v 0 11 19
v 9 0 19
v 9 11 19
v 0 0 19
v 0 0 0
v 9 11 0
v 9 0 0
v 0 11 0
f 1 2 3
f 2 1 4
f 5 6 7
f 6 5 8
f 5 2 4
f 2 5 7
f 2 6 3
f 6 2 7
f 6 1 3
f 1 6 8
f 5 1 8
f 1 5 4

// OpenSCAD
// Generated by SolidPython 1.0.1 on 2020-07-29 00:39:26


cube(size = [9, 11, 19]);
/***********************************************
*********      SolidPython code:      **********
************************************************
 
# import packages: SolidPython
from solid import *
from solid.utils import *
from itertools import chain, combinations


class Resize:

    def __init__(self, scad_file):
        self.scad_file = scad_file
        #self.scad_file = import_scad(scad_file)
        # cone/cylinder param:
        self.r1 = 0
        self.r2 = 0
        self.h = 0
        # rectangular prism param:
        self.w = 0
        self.l = 0
        # ellipse param:
        self.r = 0

    # import OpenScad code (file name corresponds to shape)


    # classify shape + parameters
    def assign(self, param1, param2, param3):
        if self.scad_file == 'cone.scad':
            self.r1 = param1
            self.r2 = param2
            self.h = param3
        elif self.scad_file == 'cylinder.scad':
            self.r1 = param1
            self.r2 = param2
            self.h = param3
        elif self.scad_file == 'rectangularPrism.scad':
            self.h = param1
            self.l = param2
            self.w = param3
        else:
            self.r = param1
            self.h = param2

    # resize parameters
    def iterate(self):
        x = range(3, 20, 2)
        i = 1
        if self.scad_file == 'cone.scad':
            tempList = list(combinations(x, 2))
            for temp in tempList:
                param1 = temp[0]
                param2 = temp[1]
                filepath = 'produced_scad_files/' + 'cone' + str(param1) + '_' + str(param2) + '_' + '.scad'
                scad_render_to_file(cylinder(h=param1, r1=param2, r2=0), filepath)

        elif self.scad_file == 'cylinder.scad':
            tempList = list(combinations(x, 3))
            for temp in tempList:
                param1 = temp[0]
                param2 = temp[1]
                filepath = 'produced_scad_files/' + 'cylinder' + str(param1) + '_' + str(param2) + '_' + '.scad'
                scad_render_to_file(cylinder(h=param1, r1=param2, r2=param2), filepath)

        elif self.scad_file == 'rectangularPrism.scad':
            tempList = list(combinations(x, 3))
            for temp in tempList:
                param1 = temp[0]
                param2 = temp[1]
                param3 = temp[2]
                filepath = 'produced_scad_files/' + 'rectangularPrism' + str(param1) + '_' + str(param2) + '_' + str(
                    param3) + '.scad'
                scad_render_to_file(cube(size=(param1, param2, param3)), filepath)

        elif self.scad_file == 'ellipse.scad':
            tempList = list(combinations(x, 4))
            for temp in tempList:
                param1 = temp[0]
                param2 = temp[1]
                param3 = temp[2]
                param4 = temp[3]
                filepath = 'produced_scad_files/' + 'ellipse' + str(param1) + '_' + str(param2) + '_' + str(param3) + '_' + str(param4) + '.scad'
                scad_render_to_file(scale([param1, param2, param3])(sphere(r=param4)), filepath)

    def render_to_scadfile(self):
        scad_render_to_file(scad, 'example.scad') 
 
************************************************/
